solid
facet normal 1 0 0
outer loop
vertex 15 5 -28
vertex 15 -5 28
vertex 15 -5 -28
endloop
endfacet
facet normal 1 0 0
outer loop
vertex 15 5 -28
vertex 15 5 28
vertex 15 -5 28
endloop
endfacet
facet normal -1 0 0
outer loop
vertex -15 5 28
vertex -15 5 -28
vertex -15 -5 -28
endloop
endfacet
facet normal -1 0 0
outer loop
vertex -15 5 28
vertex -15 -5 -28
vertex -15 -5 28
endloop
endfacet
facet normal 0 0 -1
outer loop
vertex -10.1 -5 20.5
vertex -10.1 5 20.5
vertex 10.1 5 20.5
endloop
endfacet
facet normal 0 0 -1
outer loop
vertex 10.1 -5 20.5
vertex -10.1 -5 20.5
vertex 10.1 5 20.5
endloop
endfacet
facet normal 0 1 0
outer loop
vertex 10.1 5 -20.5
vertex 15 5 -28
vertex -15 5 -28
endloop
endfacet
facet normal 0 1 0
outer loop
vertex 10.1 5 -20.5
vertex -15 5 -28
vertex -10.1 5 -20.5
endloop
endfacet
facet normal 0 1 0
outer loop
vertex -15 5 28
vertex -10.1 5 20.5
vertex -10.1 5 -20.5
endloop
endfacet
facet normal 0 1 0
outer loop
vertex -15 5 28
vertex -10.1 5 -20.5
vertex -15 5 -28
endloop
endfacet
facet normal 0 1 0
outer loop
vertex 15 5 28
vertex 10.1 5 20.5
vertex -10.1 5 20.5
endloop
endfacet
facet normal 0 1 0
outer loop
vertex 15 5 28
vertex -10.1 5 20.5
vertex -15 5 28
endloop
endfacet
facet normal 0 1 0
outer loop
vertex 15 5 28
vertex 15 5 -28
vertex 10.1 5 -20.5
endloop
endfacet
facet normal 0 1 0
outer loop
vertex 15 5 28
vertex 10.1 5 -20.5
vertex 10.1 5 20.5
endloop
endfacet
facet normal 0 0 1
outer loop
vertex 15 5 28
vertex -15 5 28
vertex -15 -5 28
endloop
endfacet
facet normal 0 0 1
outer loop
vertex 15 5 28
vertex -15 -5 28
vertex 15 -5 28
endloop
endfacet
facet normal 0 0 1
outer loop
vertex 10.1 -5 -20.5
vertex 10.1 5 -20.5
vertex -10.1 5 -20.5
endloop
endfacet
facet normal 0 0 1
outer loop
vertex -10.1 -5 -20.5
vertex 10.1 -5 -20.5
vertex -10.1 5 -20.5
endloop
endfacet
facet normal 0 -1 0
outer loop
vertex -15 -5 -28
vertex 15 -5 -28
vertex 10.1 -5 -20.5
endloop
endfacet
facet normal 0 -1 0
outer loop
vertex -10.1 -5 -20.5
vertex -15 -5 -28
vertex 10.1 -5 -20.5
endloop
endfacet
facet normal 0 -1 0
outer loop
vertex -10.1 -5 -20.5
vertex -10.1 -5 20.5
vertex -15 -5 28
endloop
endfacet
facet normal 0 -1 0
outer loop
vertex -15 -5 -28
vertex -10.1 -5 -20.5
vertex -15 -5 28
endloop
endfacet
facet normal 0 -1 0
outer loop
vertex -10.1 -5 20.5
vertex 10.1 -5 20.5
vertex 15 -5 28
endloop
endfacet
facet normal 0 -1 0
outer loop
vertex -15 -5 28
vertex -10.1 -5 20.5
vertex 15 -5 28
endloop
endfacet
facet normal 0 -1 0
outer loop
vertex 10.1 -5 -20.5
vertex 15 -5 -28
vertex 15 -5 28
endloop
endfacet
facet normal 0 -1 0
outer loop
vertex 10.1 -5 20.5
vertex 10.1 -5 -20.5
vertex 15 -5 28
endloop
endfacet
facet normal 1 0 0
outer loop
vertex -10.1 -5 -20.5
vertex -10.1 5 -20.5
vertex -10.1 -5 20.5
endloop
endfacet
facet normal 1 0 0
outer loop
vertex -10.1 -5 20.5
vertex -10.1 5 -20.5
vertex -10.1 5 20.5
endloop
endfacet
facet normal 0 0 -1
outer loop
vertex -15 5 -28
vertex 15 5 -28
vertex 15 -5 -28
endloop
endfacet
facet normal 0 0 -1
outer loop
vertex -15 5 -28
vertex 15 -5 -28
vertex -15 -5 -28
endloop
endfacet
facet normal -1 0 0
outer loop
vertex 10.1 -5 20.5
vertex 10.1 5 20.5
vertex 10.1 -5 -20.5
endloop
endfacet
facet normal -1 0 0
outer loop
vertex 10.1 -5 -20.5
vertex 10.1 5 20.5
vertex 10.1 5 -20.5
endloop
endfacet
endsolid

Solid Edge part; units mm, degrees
sketch "Sketch1" plane through (0, 0, 0) normal (0, -1, 0) x (1, 0, 0)
  line L0 (15, 28) -> (15, -28)
  line L1 (15, -28) -> (-15, -28)
  line L2 (-15, -28) -> (-15, 28)
  line L3 (-15, 28) -> (15, 28)
  line L4 (10.1, 20.5) -> (10.1, -20.5)
  line L5 (10.1, -20.5) -> (-10.1, -20.5)
  line L6 (-10.1, -20.5) -> (-10.1, 20.5)
  line L7 (-10.1, 20.5) -> (10.1, 20.5)
  dimension "D1" = 30
  dimension "D2" = 56
  dimension "D3" = 20.2
  dimension "D4" = 41
extrude "Protrusion1" add sketch "Sketch1" along normal mid plane 10
